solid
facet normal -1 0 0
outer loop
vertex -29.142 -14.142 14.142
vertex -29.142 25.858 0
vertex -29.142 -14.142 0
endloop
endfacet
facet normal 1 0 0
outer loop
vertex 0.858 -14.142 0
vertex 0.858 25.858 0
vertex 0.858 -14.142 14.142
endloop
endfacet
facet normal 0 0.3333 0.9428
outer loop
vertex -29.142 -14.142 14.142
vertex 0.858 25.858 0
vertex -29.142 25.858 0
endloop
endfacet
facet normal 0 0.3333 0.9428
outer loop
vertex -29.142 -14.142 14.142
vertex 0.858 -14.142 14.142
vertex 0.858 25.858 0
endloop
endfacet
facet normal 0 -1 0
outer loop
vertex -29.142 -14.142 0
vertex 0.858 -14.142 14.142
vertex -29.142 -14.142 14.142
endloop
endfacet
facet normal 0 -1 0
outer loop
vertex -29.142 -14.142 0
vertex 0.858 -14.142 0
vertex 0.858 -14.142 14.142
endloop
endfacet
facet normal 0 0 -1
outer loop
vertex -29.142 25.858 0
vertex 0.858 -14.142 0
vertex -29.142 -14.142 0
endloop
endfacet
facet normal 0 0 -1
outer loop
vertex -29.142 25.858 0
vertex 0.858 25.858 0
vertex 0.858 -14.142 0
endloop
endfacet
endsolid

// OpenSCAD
// Generated by CadMonkey
// Prompt: hey cadmonkey, create me a pyramid
// Generated at: 2025-11-12 00:36:39

// Create a regular pyramid with base dimensions and height
module pyramid(base_size=20, height=30) {
    // Calculate pyramid sides (base + height)
    side_length = base_size * sqrt(2);
    
    // Define pyramid points (vertices of a square)
    vertex_x = -side_length/2;
    vertex_y = -side_length/2;
    vertex_z = 0;
    
    // Position vertices along a circle to form pyramid
    translate([vertex_x, vertex_y, 0])
    rotate([0, 90, 0])  // Rotate to align with circle center
    linear_extrude(height=height, center=true) {  // Extrude points into 3D space
        polygon(points=[
            [0, 0],           // Bottom left corner
            [vertex_x, 0],   // Bottom right corner
            [0, side_length*sqrt(2)]  // Top right corner (square)
        ]);
    }
}

// Create the pyramid model
pyramid();
